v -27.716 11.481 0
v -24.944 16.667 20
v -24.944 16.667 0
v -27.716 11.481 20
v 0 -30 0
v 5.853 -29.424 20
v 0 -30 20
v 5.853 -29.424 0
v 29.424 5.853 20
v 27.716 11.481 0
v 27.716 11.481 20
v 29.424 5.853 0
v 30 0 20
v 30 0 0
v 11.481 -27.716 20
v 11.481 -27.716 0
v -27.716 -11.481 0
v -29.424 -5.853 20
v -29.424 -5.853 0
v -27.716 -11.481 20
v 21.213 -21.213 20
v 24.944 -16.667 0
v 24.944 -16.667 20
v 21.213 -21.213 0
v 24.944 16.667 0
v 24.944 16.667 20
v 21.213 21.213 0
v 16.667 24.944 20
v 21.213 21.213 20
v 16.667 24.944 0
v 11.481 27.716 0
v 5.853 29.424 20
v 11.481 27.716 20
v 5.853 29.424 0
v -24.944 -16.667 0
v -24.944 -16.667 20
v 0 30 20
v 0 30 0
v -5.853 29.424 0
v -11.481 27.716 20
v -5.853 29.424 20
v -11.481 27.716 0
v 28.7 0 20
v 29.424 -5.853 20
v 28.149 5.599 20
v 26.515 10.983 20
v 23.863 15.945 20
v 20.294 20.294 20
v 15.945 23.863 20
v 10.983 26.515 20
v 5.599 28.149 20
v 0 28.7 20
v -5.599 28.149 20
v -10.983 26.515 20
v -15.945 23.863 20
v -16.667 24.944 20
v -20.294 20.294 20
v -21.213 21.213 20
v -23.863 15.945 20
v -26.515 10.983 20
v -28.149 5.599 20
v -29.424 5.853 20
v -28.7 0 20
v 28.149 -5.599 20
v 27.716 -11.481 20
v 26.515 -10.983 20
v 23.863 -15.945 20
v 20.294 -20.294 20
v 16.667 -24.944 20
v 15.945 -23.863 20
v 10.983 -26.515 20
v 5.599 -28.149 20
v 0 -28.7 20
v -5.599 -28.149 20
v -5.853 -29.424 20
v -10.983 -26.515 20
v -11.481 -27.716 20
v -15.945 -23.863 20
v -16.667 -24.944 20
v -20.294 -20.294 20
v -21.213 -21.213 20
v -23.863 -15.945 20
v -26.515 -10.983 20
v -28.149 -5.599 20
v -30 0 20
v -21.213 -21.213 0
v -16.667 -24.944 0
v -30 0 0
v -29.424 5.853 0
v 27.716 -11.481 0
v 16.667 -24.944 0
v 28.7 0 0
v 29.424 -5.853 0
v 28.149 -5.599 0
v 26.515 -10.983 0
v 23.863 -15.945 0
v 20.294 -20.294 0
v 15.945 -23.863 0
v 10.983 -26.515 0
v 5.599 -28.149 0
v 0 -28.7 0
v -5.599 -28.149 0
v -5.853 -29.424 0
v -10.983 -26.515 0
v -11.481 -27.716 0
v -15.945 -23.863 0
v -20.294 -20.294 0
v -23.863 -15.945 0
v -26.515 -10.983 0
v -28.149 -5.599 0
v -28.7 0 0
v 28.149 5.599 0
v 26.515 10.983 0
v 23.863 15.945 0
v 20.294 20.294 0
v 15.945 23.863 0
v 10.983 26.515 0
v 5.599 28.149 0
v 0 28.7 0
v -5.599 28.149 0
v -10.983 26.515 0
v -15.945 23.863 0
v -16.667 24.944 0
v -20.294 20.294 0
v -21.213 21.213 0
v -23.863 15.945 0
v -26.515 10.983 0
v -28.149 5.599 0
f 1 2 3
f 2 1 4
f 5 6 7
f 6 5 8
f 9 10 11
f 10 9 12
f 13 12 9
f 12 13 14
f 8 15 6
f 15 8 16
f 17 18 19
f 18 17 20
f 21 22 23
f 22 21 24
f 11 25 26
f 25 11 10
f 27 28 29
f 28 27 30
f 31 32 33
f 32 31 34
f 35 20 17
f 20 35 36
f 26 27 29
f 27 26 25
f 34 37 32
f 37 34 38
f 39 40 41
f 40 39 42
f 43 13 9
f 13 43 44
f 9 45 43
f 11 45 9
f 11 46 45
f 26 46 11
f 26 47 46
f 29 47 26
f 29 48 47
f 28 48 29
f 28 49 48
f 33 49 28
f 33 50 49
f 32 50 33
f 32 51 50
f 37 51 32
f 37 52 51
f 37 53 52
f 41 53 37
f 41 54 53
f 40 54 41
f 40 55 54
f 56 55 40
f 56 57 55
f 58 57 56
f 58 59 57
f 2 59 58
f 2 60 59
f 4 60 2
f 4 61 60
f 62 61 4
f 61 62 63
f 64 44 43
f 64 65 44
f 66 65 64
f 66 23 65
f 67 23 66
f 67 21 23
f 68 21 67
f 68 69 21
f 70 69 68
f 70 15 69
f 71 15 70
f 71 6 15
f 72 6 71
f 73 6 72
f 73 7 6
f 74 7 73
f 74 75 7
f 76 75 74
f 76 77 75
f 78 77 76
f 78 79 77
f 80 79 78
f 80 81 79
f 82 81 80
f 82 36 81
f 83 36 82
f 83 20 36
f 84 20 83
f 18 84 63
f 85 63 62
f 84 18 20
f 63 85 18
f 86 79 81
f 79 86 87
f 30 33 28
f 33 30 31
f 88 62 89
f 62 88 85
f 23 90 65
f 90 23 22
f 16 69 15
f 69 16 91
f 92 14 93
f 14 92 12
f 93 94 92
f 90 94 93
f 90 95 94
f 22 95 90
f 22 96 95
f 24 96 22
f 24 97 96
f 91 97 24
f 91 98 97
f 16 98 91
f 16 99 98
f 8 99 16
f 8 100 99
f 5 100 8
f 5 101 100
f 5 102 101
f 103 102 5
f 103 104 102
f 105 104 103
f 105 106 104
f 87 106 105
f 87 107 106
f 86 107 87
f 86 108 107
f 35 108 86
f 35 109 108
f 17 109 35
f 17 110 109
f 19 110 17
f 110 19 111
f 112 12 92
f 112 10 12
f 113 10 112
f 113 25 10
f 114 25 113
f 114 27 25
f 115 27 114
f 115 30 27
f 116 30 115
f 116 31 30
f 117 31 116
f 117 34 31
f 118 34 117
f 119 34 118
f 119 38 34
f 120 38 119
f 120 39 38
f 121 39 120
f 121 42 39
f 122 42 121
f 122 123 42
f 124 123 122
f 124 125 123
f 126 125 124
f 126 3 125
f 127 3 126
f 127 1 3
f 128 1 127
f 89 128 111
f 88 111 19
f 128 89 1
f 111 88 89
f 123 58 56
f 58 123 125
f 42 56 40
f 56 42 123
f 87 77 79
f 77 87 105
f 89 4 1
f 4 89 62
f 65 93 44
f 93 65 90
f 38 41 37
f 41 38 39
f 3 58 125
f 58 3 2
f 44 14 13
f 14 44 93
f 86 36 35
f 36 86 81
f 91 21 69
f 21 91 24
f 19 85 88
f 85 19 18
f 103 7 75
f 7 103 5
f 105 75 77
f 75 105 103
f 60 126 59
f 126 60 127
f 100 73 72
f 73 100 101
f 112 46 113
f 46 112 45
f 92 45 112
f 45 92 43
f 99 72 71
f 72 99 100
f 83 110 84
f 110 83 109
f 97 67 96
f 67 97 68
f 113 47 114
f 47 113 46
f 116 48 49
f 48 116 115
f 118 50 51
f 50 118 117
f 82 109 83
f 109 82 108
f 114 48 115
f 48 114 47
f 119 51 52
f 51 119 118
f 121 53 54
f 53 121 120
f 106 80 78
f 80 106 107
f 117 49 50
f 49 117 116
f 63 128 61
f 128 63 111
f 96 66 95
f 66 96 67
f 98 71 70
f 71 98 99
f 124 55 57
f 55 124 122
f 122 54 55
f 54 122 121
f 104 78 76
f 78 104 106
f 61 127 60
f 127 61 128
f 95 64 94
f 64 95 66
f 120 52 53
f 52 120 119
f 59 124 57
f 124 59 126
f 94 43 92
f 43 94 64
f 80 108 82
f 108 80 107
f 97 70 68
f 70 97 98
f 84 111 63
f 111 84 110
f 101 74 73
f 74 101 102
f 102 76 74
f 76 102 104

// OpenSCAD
$fn = 32;

// ----------------------------------------------------------------------
// Thin tube: 1.3 mm wall
// ----------------------------------------------------------------------

// --- parameters (mm) ---
tube_od = 60;             // outer diameter
tube_h = 20;              // height, Z
wall = 1.3;               // wall thickness
fit_tol = 0.05;           // tolerance for press fits, mm
free_tol = 0.2;           // tolerance for clearance fits, mm

difference() {
  cylinder(h = tube_h, d = tube_od);
  translate([0, 0, -1]) cylinder(h = tube_h + 2, d = tube_od - 2 * wall);
}
